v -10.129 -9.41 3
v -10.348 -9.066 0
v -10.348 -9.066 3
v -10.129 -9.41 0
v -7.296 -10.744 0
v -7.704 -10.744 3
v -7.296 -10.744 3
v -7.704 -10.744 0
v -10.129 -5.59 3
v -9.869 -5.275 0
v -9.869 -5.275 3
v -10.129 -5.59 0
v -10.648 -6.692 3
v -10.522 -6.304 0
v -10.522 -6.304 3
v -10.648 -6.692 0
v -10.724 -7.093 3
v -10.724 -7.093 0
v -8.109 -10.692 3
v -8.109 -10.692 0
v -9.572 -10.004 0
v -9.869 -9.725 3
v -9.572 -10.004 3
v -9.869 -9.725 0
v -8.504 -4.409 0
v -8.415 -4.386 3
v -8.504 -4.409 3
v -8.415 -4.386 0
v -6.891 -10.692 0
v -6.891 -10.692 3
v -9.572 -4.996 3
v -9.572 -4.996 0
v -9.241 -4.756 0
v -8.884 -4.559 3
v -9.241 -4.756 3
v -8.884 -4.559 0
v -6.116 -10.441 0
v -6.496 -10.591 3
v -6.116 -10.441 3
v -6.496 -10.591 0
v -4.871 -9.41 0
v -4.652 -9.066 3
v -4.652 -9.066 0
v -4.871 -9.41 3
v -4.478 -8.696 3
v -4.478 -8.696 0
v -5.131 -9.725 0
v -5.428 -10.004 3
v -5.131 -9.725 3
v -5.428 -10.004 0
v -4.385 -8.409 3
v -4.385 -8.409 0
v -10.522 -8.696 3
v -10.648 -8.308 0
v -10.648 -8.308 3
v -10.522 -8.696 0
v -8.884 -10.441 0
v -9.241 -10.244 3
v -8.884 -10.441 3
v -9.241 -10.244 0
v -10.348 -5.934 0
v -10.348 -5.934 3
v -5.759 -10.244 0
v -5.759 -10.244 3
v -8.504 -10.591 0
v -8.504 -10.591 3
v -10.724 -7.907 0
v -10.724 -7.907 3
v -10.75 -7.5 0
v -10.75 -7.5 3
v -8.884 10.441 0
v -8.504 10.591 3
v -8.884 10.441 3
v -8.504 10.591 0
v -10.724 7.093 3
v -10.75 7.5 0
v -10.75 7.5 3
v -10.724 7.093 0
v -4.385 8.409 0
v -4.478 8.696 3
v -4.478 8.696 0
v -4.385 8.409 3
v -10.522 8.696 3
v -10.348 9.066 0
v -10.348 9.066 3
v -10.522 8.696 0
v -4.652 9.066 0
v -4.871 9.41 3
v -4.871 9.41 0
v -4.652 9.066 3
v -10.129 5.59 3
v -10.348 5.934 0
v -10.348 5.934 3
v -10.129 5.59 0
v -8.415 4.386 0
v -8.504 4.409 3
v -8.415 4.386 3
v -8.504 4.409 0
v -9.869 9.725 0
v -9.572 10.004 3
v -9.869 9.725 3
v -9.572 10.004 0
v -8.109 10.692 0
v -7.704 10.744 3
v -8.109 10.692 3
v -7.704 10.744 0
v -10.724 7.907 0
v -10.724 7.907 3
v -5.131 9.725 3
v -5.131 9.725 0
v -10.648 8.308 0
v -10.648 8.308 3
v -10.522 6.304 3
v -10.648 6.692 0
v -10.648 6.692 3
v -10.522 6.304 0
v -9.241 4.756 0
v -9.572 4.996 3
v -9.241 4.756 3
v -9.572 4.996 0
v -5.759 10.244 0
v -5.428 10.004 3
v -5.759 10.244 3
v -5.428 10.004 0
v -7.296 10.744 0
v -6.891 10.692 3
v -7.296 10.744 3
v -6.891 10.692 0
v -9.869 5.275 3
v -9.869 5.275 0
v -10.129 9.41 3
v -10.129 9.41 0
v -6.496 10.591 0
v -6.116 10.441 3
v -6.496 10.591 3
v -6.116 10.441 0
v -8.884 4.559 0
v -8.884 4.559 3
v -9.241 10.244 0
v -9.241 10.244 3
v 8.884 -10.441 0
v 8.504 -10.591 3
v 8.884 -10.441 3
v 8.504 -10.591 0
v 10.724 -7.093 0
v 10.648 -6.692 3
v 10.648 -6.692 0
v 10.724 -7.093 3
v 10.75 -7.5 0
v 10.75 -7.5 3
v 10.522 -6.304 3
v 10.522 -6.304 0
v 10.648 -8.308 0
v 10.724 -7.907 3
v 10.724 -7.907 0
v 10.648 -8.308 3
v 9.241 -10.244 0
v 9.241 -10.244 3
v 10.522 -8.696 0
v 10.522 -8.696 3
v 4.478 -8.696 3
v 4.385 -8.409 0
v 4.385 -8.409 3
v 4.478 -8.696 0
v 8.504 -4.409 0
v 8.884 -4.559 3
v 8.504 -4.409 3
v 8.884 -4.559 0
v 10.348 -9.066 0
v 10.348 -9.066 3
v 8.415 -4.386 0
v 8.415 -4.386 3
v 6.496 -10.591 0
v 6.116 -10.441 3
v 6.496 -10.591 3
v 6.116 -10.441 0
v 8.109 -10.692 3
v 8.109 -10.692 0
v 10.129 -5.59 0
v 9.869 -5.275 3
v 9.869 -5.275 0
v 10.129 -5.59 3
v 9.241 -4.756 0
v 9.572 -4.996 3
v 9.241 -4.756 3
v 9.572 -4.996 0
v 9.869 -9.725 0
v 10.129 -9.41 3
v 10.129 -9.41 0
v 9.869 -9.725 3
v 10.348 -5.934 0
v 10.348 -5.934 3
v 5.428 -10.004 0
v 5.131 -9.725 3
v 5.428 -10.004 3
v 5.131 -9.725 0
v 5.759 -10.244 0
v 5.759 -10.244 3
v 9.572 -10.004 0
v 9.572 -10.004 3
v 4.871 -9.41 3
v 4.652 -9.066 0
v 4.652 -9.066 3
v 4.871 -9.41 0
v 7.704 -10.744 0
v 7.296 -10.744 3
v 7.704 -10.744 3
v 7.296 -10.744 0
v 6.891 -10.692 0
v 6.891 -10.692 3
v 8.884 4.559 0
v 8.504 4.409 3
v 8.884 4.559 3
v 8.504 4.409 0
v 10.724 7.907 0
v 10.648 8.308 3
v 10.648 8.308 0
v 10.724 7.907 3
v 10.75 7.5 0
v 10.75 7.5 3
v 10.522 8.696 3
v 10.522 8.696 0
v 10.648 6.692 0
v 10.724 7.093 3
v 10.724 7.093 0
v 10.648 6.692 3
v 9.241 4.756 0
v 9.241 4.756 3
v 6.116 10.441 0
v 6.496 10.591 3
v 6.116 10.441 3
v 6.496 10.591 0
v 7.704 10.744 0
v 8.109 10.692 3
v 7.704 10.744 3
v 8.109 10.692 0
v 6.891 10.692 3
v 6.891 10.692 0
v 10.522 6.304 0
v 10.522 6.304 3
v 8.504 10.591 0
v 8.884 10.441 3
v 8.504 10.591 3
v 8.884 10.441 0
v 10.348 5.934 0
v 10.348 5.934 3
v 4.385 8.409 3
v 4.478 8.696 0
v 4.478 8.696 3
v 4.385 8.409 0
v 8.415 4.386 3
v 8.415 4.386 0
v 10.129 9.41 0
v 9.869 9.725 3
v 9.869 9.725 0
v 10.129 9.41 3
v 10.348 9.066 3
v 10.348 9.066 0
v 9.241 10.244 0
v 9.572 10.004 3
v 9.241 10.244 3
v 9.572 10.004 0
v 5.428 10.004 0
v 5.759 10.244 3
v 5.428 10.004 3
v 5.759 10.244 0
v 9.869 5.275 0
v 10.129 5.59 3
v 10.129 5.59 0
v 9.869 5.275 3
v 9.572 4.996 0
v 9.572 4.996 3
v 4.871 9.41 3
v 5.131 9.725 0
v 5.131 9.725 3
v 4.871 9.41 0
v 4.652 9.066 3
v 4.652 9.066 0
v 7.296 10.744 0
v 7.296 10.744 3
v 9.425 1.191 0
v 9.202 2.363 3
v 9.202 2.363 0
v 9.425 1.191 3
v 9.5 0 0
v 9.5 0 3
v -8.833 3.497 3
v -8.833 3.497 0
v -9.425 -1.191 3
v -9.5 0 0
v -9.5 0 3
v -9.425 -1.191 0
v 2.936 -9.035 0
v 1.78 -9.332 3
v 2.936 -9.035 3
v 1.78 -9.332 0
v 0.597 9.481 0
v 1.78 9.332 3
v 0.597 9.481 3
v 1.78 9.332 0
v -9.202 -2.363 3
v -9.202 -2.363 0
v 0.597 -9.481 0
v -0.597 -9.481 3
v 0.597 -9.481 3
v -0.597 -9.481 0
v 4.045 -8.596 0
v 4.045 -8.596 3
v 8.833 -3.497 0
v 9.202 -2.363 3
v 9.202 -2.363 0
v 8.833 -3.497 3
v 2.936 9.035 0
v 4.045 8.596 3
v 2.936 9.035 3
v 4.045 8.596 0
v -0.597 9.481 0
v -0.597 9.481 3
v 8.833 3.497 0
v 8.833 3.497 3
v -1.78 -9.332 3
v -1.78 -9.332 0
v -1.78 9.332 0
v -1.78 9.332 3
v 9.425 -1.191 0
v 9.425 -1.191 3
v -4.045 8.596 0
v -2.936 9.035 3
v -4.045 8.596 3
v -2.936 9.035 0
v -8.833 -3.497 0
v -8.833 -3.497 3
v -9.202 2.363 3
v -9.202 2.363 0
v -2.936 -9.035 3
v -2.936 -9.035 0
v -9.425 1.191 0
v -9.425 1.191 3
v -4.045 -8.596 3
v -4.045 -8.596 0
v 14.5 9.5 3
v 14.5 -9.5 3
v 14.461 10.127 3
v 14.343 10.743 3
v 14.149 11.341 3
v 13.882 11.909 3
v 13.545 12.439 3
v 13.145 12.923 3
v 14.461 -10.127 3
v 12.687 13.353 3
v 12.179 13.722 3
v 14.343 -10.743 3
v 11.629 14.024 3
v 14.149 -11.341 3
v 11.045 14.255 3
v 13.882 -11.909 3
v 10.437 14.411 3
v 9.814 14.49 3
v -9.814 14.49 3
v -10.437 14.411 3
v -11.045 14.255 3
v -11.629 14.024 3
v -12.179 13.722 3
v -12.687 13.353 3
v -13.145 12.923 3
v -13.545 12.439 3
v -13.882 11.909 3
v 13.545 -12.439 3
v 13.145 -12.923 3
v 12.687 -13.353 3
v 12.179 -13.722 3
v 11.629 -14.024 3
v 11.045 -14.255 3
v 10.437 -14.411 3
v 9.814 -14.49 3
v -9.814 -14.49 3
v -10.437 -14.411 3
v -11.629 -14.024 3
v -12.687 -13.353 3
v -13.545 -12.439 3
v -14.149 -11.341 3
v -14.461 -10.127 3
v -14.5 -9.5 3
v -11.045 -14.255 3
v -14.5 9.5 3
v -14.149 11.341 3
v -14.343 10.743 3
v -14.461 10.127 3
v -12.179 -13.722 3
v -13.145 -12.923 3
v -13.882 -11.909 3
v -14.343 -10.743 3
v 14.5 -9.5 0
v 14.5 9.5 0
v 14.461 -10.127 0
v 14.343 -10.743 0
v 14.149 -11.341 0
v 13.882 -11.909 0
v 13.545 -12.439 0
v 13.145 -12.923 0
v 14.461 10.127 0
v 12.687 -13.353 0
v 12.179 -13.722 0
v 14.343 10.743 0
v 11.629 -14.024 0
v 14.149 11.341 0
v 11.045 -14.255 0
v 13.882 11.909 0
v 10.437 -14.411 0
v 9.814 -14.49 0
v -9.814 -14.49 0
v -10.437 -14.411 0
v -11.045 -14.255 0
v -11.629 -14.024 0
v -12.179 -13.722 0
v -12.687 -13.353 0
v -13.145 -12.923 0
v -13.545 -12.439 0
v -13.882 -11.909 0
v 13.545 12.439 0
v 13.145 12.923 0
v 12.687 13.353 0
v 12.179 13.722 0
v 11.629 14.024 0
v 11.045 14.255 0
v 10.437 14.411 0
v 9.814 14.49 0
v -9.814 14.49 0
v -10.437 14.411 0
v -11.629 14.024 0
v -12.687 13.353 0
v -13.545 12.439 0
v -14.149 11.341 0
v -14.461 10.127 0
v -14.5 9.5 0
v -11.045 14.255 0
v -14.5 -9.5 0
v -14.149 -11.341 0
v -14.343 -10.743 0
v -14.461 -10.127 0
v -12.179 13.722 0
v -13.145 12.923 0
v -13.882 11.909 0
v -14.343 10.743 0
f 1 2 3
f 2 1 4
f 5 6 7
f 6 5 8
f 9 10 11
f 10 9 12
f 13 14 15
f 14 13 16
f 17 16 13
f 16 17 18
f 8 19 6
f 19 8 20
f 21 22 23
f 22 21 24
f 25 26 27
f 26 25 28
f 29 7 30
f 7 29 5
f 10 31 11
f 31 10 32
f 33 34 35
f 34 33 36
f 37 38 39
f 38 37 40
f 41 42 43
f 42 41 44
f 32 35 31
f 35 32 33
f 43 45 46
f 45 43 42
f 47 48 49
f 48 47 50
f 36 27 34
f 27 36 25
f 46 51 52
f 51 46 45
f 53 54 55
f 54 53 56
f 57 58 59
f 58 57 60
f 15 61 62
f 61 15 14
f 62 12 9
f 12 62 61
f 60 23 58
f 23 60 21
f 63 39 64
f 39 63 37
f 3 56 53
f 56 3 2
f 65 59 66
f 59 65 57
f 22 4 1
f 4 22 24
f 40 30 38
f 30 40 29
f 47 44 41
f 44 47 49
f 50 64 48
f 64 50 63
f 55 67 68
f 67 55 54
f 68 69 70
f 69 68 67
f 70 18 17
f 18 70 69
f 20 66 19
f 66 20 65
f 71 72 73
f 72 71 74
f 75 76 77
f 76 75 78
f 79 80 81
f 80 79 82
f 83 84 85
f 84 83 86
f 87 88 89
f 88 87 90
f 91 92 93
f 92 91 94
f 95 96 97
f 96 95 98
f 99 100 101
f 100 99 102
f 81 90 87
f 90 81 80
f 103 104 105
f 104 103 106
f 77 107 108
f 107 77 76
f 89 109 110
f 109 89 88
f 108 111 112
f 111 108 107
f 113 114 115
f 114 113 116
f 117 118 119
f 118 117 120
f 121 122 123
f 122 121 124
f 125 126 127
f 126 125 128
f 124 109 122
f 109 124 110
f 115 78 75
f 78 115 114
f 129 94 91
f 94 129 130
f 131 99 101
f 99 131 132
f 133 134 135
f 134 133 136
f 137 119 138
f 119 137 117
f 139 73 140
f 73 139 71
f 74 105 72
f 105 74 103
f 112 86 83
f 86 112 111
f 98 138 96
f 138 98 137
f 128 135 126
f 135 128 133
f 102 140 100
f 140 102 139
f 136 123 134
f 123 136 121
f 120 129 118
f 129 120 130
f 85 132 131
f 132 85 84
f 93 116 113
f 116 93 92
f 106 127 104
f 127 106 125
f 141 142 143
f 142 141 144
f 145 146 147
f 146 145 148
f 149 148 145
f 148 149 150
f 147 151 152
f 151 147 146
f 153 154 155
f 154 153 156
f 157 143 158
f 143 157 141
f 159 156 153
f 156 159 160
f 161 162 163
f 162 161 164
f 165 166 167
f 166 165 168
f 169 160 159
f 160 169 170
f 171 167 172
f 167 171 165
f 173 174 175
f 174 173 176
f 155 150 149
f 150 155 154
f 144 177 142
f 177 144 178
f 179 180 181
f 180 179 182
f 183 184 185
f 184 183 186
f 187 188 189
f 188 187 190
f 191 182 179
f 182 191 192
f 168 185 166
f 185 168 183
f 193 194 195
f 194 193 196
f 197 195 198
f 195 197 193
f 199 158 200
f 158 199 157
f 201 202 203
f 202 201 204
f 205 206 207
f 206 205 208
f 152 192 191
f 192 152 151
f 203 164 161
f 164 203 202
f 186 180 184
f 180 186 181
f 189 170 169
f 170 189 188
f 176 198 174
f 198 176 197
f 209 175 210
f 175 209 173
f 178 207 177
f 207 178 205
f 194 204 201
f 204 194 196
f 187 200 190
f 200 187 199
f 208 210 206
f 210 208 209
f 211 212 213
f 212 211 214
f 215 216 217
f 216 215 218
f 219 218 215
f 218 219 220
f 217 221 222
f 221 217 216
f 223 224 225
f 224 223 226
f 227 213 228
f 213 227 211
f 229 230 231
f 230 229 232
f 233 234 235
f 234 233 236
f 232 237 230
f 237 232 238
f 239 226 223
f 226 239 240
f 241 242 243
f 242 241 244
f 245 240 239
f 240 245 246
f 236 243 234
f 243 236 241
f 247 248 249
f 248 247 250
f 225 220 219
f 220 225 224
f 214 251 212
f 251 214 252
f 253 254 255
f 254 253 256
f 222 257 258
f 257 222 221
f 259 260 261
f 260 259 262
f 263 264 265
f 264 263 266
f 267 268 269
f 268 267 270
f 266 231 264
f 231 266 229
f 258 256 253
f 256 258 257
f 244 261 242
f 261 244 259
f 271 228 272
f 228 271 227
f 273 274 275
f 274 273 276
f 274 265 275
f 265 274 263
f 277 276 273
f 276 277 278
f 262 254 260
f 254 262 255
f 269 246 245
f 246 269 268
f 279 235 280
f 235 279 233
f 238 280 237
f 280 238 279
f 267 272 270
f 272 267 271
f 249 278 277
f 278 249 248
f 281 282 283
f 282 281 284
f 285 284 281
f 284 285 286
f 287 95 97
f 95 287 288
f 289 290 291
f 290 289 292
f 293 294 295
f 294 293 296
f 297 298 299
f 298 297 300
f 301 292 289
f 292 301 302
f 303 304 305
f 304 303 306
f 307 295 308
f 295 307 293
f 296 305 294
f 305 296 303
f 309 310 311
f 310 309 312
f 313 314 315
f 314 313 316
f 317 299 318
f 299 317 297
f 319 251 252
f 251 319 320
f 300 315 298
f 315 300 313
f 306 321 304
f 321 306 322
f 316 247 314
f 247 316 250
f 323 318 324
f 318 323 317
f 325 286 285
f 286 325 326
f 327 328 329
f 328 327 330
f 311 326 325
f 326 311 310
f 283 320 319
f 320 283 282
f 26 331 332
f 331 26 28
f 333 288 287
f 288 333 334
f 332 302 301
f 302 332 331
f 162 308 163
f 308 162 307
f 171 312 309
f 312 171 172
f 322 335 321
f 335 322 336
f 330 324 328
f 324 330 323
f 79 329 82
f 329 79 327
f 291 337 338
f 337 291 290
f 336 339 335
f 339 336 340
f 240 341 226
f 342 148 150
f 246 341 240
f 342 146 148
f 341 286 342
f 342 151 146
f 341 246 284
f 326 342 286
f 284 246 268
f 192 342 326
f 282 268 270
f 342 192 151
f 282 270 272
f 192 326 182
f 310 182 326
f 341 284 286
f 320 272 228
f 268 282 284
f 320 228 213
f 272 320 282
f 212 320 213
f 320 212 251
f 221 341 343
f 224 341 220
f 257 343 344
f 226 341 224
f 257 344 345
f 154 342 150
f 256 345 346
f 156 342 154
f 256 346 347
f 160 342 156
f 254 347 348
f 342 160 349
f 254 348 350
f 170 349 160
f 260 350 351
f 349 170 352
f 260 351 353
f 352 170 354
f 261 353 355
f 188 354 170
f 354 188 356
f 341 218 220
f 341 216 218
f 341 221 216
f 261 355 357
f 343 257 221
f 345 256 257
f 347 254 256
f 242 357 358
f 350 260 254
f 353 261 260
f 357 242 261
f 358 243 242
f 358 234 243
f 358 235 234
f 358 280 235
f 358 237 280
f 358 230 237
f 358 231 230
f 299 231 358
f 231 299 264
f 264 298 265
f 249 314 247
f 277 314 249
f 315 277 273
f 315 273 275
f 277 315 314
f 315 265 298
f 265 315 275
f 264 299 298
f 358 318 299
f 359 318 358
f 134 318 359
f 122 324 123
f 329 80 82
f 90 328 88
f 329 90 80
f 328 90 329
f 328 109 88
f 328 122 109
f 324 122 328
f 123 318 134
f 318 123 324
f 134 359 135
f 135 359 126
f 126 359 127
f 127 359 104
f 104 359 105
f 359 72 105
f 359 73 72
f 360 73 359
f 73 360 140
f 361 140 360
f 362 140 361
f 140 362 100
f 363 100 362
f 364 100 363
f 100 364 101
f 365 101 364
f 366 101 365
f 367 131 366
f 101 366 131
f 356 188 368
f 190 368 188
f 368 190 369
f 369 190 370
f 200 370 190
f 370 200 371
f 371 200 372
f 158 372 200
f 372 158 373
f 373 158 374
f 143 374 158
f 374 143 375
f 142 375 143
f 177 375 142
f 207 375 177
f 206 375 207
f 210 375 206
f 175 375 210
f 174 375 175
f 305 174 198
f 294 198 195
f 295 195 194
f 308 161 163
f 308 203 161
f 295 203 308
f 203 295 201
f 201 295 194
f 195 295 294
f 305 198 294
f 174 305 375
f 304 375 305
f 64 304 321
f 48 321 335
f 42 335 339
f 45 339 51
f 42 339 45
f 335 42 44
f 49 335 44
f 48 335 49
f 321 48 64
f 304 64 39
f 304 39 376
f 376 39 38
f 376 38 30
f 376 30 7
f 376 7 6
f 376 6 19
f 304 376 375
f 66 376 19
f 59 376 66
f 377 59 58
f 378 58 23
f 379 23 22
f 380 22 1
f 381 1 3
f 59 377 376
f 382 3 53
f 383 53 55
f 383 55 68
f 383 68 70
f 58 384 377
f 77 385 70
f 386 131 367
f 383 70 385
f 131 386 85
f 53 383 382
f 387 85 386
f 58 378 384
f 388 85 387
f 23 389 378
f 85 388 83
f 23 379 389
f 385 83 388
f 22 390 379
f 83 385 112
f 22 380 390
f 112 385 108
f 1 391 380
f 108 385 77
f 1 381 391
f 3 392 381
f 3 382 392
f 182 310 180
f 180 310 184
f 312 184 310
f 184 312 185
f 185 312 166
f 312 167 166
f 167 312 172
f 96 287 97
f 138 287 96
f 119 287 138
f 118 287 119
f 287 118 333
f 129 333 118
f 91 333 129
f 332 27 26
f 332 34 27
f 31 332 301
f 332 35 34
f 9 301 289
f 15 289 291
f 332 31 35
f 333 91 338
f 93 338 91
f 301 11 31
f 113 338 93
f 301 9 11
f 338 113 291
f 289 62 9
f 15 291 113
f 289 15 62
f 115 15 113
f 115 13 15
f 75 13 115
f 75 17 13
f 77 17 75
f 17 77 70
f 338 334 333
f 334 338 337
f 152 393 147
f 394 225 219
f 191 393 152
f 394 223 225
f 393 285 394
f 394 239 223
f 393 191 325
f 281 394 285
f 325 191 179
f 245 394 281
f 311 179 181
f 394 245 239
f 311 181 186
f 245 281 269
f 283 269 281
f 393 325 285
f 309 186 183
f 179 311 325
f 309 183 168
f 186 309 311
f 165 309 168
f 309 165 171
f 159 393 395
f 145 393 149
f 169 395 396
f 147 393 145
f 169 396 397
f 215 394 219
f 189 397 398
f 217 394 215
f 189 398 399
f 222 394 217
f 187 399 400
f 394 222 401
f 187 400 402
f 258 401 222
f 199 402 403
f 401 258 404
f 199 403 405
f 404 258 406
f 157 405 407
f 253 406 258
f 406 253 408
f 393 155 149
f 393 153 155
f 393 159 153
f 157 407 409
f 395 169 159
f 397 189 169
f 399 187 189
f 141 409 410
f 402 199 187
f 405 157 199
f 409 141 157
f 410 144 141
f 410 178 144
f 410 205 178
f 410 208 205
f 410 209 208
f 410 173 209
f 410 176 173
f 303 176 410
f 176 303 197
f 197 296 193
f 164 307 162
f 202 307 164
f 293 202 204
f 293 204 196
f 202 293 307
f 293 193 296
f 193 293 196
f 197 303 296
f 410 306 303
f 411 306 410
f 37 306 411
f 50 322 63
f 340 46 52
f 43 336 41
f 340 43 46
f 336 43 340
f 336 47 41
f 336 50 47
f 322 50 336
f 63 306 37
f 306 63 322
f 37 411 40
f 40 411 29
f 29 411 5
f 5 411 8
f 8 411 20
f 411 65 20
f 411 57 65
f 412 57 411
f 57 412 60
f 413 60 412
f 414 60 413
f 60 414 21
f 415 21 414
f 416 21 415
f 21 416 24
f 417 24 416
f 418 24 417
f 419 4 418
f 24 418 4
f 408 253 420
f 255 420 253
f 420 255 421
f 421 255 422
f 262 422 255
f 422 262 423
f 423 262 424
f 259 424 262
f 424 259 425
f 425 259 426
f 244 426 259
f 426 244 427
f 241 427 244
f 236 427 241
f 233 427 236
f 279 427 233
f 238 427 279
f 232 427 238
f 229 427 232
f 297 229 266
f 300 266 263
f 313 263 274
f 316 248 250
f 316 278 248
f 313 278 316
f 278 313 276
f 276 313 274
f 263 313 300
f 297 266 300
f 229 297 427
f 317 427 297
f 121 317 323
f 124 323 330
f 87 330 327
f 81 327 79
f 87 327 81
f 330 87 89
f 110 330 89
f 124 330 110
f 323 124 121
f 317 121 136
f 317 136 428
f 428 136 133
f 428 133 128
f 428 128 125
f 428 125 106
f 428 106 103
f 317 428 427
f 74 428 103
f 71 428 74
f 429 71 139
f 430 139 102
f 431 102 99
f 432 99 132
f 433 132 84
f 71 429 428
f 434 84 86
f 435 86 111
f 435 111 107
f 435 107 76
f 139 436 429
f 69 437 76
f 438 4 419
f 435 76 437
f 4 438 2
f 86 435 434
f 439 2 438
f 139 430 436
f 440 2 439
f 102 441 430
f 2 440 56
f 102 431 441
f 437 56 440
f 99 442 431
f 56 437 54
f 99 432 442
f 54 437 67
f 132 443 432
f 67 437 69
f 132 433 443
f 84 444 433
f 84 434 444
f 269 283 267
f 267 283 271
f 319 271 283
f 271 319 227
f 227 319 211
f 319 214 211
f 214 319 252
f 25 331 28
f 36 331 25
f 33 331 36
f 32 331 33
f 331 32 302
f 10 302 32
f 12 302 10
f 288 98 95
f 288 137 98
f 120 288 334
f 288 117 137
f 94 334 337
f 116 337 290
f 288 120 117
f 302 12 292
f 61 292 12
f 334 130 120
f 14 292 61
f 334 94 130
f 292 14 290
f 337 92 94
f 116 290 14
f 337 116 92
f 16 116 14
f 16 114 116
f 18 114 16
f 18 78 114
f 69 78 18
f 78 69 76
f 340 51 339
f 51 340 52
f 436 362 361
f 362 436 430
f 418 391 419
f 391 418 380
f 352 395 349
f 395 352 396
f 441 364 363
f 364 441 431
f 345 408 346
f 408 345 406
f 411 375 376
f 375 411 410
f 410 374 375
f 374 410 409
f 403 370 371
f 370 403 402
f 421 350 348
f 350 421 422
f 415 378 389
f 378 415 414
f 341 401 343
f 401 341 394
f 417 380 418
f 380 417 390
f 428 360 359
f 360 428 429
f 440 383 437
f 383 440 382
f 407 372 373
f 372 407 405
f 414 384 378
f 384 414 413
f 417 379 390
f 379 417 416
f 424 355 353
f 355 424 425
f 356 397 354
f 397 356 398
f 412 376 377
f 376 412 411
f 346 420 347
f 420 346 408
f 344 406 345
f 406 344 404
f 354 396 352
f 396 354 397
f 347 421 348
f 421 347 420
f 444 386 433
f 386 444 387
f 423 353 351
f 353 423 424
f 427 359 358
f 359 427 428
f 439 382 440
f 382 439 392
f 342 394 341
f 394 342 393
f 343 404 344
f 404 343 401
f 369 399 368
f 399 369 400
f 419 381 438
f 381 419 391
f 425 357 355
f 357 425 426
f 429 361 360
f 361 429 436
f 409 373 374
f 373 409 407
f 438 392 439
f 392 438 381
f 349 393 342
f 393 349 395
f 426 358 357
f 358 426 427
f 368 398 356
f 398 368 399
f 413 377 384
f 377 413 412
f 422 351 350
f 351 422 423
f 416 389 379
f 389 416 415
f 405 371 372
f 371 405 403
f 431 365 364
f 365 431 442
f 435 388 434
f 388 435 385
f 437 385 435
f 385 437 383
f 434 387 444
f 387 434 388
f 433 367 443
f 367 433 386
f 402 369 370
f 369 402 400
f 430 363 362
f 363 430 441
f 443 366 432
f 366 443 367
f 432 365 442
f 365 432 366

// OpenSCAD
$fn = 50;


difference() {
	union() {
		hull() {
			translate(v = [-9.5000000000, 9.5000000000, 0]) {
				cylinder(h = 3, r = 5);
			}
			translate(v = [9.5000000000, 9.5000000000, 0]) {
				cylinder(h = 3, r = 5);
			}
			translate(v = [-9.5000000000, -9.5000000000, 0]) {
				cylinder(h = 3, r = 5);
			}
			translate(v = [9.5000000000, -9.5000000000, 0]) {
				cylinder(h = 3, r = 5);
			}
		}
	}
	union() {
		#translate(v = [-7.5000000000, -7.5000000000, -100.0000000000]) {
			cylinder(h = 200, r = 3.2500000000);
		}
		#translate(v = [-7.5000000000, 7.5000000000, -100.0000000000]) {
			cylinder(h = 200, r = 3.2500000000);
		}
		#translate(v = [7.5000000000, -7.5000000000, -100.0000000000]) {
			cylinder(h = 200, r = 3.2500000000);
		}
		#translate(v = [7.5000000000, 7.5000000000, -100.0000000000]) {
			cylinder(h = 200, r = 3.2500000000);
		}
		#cylinder(h = 3, r = 9.5000000000);
	}
}
